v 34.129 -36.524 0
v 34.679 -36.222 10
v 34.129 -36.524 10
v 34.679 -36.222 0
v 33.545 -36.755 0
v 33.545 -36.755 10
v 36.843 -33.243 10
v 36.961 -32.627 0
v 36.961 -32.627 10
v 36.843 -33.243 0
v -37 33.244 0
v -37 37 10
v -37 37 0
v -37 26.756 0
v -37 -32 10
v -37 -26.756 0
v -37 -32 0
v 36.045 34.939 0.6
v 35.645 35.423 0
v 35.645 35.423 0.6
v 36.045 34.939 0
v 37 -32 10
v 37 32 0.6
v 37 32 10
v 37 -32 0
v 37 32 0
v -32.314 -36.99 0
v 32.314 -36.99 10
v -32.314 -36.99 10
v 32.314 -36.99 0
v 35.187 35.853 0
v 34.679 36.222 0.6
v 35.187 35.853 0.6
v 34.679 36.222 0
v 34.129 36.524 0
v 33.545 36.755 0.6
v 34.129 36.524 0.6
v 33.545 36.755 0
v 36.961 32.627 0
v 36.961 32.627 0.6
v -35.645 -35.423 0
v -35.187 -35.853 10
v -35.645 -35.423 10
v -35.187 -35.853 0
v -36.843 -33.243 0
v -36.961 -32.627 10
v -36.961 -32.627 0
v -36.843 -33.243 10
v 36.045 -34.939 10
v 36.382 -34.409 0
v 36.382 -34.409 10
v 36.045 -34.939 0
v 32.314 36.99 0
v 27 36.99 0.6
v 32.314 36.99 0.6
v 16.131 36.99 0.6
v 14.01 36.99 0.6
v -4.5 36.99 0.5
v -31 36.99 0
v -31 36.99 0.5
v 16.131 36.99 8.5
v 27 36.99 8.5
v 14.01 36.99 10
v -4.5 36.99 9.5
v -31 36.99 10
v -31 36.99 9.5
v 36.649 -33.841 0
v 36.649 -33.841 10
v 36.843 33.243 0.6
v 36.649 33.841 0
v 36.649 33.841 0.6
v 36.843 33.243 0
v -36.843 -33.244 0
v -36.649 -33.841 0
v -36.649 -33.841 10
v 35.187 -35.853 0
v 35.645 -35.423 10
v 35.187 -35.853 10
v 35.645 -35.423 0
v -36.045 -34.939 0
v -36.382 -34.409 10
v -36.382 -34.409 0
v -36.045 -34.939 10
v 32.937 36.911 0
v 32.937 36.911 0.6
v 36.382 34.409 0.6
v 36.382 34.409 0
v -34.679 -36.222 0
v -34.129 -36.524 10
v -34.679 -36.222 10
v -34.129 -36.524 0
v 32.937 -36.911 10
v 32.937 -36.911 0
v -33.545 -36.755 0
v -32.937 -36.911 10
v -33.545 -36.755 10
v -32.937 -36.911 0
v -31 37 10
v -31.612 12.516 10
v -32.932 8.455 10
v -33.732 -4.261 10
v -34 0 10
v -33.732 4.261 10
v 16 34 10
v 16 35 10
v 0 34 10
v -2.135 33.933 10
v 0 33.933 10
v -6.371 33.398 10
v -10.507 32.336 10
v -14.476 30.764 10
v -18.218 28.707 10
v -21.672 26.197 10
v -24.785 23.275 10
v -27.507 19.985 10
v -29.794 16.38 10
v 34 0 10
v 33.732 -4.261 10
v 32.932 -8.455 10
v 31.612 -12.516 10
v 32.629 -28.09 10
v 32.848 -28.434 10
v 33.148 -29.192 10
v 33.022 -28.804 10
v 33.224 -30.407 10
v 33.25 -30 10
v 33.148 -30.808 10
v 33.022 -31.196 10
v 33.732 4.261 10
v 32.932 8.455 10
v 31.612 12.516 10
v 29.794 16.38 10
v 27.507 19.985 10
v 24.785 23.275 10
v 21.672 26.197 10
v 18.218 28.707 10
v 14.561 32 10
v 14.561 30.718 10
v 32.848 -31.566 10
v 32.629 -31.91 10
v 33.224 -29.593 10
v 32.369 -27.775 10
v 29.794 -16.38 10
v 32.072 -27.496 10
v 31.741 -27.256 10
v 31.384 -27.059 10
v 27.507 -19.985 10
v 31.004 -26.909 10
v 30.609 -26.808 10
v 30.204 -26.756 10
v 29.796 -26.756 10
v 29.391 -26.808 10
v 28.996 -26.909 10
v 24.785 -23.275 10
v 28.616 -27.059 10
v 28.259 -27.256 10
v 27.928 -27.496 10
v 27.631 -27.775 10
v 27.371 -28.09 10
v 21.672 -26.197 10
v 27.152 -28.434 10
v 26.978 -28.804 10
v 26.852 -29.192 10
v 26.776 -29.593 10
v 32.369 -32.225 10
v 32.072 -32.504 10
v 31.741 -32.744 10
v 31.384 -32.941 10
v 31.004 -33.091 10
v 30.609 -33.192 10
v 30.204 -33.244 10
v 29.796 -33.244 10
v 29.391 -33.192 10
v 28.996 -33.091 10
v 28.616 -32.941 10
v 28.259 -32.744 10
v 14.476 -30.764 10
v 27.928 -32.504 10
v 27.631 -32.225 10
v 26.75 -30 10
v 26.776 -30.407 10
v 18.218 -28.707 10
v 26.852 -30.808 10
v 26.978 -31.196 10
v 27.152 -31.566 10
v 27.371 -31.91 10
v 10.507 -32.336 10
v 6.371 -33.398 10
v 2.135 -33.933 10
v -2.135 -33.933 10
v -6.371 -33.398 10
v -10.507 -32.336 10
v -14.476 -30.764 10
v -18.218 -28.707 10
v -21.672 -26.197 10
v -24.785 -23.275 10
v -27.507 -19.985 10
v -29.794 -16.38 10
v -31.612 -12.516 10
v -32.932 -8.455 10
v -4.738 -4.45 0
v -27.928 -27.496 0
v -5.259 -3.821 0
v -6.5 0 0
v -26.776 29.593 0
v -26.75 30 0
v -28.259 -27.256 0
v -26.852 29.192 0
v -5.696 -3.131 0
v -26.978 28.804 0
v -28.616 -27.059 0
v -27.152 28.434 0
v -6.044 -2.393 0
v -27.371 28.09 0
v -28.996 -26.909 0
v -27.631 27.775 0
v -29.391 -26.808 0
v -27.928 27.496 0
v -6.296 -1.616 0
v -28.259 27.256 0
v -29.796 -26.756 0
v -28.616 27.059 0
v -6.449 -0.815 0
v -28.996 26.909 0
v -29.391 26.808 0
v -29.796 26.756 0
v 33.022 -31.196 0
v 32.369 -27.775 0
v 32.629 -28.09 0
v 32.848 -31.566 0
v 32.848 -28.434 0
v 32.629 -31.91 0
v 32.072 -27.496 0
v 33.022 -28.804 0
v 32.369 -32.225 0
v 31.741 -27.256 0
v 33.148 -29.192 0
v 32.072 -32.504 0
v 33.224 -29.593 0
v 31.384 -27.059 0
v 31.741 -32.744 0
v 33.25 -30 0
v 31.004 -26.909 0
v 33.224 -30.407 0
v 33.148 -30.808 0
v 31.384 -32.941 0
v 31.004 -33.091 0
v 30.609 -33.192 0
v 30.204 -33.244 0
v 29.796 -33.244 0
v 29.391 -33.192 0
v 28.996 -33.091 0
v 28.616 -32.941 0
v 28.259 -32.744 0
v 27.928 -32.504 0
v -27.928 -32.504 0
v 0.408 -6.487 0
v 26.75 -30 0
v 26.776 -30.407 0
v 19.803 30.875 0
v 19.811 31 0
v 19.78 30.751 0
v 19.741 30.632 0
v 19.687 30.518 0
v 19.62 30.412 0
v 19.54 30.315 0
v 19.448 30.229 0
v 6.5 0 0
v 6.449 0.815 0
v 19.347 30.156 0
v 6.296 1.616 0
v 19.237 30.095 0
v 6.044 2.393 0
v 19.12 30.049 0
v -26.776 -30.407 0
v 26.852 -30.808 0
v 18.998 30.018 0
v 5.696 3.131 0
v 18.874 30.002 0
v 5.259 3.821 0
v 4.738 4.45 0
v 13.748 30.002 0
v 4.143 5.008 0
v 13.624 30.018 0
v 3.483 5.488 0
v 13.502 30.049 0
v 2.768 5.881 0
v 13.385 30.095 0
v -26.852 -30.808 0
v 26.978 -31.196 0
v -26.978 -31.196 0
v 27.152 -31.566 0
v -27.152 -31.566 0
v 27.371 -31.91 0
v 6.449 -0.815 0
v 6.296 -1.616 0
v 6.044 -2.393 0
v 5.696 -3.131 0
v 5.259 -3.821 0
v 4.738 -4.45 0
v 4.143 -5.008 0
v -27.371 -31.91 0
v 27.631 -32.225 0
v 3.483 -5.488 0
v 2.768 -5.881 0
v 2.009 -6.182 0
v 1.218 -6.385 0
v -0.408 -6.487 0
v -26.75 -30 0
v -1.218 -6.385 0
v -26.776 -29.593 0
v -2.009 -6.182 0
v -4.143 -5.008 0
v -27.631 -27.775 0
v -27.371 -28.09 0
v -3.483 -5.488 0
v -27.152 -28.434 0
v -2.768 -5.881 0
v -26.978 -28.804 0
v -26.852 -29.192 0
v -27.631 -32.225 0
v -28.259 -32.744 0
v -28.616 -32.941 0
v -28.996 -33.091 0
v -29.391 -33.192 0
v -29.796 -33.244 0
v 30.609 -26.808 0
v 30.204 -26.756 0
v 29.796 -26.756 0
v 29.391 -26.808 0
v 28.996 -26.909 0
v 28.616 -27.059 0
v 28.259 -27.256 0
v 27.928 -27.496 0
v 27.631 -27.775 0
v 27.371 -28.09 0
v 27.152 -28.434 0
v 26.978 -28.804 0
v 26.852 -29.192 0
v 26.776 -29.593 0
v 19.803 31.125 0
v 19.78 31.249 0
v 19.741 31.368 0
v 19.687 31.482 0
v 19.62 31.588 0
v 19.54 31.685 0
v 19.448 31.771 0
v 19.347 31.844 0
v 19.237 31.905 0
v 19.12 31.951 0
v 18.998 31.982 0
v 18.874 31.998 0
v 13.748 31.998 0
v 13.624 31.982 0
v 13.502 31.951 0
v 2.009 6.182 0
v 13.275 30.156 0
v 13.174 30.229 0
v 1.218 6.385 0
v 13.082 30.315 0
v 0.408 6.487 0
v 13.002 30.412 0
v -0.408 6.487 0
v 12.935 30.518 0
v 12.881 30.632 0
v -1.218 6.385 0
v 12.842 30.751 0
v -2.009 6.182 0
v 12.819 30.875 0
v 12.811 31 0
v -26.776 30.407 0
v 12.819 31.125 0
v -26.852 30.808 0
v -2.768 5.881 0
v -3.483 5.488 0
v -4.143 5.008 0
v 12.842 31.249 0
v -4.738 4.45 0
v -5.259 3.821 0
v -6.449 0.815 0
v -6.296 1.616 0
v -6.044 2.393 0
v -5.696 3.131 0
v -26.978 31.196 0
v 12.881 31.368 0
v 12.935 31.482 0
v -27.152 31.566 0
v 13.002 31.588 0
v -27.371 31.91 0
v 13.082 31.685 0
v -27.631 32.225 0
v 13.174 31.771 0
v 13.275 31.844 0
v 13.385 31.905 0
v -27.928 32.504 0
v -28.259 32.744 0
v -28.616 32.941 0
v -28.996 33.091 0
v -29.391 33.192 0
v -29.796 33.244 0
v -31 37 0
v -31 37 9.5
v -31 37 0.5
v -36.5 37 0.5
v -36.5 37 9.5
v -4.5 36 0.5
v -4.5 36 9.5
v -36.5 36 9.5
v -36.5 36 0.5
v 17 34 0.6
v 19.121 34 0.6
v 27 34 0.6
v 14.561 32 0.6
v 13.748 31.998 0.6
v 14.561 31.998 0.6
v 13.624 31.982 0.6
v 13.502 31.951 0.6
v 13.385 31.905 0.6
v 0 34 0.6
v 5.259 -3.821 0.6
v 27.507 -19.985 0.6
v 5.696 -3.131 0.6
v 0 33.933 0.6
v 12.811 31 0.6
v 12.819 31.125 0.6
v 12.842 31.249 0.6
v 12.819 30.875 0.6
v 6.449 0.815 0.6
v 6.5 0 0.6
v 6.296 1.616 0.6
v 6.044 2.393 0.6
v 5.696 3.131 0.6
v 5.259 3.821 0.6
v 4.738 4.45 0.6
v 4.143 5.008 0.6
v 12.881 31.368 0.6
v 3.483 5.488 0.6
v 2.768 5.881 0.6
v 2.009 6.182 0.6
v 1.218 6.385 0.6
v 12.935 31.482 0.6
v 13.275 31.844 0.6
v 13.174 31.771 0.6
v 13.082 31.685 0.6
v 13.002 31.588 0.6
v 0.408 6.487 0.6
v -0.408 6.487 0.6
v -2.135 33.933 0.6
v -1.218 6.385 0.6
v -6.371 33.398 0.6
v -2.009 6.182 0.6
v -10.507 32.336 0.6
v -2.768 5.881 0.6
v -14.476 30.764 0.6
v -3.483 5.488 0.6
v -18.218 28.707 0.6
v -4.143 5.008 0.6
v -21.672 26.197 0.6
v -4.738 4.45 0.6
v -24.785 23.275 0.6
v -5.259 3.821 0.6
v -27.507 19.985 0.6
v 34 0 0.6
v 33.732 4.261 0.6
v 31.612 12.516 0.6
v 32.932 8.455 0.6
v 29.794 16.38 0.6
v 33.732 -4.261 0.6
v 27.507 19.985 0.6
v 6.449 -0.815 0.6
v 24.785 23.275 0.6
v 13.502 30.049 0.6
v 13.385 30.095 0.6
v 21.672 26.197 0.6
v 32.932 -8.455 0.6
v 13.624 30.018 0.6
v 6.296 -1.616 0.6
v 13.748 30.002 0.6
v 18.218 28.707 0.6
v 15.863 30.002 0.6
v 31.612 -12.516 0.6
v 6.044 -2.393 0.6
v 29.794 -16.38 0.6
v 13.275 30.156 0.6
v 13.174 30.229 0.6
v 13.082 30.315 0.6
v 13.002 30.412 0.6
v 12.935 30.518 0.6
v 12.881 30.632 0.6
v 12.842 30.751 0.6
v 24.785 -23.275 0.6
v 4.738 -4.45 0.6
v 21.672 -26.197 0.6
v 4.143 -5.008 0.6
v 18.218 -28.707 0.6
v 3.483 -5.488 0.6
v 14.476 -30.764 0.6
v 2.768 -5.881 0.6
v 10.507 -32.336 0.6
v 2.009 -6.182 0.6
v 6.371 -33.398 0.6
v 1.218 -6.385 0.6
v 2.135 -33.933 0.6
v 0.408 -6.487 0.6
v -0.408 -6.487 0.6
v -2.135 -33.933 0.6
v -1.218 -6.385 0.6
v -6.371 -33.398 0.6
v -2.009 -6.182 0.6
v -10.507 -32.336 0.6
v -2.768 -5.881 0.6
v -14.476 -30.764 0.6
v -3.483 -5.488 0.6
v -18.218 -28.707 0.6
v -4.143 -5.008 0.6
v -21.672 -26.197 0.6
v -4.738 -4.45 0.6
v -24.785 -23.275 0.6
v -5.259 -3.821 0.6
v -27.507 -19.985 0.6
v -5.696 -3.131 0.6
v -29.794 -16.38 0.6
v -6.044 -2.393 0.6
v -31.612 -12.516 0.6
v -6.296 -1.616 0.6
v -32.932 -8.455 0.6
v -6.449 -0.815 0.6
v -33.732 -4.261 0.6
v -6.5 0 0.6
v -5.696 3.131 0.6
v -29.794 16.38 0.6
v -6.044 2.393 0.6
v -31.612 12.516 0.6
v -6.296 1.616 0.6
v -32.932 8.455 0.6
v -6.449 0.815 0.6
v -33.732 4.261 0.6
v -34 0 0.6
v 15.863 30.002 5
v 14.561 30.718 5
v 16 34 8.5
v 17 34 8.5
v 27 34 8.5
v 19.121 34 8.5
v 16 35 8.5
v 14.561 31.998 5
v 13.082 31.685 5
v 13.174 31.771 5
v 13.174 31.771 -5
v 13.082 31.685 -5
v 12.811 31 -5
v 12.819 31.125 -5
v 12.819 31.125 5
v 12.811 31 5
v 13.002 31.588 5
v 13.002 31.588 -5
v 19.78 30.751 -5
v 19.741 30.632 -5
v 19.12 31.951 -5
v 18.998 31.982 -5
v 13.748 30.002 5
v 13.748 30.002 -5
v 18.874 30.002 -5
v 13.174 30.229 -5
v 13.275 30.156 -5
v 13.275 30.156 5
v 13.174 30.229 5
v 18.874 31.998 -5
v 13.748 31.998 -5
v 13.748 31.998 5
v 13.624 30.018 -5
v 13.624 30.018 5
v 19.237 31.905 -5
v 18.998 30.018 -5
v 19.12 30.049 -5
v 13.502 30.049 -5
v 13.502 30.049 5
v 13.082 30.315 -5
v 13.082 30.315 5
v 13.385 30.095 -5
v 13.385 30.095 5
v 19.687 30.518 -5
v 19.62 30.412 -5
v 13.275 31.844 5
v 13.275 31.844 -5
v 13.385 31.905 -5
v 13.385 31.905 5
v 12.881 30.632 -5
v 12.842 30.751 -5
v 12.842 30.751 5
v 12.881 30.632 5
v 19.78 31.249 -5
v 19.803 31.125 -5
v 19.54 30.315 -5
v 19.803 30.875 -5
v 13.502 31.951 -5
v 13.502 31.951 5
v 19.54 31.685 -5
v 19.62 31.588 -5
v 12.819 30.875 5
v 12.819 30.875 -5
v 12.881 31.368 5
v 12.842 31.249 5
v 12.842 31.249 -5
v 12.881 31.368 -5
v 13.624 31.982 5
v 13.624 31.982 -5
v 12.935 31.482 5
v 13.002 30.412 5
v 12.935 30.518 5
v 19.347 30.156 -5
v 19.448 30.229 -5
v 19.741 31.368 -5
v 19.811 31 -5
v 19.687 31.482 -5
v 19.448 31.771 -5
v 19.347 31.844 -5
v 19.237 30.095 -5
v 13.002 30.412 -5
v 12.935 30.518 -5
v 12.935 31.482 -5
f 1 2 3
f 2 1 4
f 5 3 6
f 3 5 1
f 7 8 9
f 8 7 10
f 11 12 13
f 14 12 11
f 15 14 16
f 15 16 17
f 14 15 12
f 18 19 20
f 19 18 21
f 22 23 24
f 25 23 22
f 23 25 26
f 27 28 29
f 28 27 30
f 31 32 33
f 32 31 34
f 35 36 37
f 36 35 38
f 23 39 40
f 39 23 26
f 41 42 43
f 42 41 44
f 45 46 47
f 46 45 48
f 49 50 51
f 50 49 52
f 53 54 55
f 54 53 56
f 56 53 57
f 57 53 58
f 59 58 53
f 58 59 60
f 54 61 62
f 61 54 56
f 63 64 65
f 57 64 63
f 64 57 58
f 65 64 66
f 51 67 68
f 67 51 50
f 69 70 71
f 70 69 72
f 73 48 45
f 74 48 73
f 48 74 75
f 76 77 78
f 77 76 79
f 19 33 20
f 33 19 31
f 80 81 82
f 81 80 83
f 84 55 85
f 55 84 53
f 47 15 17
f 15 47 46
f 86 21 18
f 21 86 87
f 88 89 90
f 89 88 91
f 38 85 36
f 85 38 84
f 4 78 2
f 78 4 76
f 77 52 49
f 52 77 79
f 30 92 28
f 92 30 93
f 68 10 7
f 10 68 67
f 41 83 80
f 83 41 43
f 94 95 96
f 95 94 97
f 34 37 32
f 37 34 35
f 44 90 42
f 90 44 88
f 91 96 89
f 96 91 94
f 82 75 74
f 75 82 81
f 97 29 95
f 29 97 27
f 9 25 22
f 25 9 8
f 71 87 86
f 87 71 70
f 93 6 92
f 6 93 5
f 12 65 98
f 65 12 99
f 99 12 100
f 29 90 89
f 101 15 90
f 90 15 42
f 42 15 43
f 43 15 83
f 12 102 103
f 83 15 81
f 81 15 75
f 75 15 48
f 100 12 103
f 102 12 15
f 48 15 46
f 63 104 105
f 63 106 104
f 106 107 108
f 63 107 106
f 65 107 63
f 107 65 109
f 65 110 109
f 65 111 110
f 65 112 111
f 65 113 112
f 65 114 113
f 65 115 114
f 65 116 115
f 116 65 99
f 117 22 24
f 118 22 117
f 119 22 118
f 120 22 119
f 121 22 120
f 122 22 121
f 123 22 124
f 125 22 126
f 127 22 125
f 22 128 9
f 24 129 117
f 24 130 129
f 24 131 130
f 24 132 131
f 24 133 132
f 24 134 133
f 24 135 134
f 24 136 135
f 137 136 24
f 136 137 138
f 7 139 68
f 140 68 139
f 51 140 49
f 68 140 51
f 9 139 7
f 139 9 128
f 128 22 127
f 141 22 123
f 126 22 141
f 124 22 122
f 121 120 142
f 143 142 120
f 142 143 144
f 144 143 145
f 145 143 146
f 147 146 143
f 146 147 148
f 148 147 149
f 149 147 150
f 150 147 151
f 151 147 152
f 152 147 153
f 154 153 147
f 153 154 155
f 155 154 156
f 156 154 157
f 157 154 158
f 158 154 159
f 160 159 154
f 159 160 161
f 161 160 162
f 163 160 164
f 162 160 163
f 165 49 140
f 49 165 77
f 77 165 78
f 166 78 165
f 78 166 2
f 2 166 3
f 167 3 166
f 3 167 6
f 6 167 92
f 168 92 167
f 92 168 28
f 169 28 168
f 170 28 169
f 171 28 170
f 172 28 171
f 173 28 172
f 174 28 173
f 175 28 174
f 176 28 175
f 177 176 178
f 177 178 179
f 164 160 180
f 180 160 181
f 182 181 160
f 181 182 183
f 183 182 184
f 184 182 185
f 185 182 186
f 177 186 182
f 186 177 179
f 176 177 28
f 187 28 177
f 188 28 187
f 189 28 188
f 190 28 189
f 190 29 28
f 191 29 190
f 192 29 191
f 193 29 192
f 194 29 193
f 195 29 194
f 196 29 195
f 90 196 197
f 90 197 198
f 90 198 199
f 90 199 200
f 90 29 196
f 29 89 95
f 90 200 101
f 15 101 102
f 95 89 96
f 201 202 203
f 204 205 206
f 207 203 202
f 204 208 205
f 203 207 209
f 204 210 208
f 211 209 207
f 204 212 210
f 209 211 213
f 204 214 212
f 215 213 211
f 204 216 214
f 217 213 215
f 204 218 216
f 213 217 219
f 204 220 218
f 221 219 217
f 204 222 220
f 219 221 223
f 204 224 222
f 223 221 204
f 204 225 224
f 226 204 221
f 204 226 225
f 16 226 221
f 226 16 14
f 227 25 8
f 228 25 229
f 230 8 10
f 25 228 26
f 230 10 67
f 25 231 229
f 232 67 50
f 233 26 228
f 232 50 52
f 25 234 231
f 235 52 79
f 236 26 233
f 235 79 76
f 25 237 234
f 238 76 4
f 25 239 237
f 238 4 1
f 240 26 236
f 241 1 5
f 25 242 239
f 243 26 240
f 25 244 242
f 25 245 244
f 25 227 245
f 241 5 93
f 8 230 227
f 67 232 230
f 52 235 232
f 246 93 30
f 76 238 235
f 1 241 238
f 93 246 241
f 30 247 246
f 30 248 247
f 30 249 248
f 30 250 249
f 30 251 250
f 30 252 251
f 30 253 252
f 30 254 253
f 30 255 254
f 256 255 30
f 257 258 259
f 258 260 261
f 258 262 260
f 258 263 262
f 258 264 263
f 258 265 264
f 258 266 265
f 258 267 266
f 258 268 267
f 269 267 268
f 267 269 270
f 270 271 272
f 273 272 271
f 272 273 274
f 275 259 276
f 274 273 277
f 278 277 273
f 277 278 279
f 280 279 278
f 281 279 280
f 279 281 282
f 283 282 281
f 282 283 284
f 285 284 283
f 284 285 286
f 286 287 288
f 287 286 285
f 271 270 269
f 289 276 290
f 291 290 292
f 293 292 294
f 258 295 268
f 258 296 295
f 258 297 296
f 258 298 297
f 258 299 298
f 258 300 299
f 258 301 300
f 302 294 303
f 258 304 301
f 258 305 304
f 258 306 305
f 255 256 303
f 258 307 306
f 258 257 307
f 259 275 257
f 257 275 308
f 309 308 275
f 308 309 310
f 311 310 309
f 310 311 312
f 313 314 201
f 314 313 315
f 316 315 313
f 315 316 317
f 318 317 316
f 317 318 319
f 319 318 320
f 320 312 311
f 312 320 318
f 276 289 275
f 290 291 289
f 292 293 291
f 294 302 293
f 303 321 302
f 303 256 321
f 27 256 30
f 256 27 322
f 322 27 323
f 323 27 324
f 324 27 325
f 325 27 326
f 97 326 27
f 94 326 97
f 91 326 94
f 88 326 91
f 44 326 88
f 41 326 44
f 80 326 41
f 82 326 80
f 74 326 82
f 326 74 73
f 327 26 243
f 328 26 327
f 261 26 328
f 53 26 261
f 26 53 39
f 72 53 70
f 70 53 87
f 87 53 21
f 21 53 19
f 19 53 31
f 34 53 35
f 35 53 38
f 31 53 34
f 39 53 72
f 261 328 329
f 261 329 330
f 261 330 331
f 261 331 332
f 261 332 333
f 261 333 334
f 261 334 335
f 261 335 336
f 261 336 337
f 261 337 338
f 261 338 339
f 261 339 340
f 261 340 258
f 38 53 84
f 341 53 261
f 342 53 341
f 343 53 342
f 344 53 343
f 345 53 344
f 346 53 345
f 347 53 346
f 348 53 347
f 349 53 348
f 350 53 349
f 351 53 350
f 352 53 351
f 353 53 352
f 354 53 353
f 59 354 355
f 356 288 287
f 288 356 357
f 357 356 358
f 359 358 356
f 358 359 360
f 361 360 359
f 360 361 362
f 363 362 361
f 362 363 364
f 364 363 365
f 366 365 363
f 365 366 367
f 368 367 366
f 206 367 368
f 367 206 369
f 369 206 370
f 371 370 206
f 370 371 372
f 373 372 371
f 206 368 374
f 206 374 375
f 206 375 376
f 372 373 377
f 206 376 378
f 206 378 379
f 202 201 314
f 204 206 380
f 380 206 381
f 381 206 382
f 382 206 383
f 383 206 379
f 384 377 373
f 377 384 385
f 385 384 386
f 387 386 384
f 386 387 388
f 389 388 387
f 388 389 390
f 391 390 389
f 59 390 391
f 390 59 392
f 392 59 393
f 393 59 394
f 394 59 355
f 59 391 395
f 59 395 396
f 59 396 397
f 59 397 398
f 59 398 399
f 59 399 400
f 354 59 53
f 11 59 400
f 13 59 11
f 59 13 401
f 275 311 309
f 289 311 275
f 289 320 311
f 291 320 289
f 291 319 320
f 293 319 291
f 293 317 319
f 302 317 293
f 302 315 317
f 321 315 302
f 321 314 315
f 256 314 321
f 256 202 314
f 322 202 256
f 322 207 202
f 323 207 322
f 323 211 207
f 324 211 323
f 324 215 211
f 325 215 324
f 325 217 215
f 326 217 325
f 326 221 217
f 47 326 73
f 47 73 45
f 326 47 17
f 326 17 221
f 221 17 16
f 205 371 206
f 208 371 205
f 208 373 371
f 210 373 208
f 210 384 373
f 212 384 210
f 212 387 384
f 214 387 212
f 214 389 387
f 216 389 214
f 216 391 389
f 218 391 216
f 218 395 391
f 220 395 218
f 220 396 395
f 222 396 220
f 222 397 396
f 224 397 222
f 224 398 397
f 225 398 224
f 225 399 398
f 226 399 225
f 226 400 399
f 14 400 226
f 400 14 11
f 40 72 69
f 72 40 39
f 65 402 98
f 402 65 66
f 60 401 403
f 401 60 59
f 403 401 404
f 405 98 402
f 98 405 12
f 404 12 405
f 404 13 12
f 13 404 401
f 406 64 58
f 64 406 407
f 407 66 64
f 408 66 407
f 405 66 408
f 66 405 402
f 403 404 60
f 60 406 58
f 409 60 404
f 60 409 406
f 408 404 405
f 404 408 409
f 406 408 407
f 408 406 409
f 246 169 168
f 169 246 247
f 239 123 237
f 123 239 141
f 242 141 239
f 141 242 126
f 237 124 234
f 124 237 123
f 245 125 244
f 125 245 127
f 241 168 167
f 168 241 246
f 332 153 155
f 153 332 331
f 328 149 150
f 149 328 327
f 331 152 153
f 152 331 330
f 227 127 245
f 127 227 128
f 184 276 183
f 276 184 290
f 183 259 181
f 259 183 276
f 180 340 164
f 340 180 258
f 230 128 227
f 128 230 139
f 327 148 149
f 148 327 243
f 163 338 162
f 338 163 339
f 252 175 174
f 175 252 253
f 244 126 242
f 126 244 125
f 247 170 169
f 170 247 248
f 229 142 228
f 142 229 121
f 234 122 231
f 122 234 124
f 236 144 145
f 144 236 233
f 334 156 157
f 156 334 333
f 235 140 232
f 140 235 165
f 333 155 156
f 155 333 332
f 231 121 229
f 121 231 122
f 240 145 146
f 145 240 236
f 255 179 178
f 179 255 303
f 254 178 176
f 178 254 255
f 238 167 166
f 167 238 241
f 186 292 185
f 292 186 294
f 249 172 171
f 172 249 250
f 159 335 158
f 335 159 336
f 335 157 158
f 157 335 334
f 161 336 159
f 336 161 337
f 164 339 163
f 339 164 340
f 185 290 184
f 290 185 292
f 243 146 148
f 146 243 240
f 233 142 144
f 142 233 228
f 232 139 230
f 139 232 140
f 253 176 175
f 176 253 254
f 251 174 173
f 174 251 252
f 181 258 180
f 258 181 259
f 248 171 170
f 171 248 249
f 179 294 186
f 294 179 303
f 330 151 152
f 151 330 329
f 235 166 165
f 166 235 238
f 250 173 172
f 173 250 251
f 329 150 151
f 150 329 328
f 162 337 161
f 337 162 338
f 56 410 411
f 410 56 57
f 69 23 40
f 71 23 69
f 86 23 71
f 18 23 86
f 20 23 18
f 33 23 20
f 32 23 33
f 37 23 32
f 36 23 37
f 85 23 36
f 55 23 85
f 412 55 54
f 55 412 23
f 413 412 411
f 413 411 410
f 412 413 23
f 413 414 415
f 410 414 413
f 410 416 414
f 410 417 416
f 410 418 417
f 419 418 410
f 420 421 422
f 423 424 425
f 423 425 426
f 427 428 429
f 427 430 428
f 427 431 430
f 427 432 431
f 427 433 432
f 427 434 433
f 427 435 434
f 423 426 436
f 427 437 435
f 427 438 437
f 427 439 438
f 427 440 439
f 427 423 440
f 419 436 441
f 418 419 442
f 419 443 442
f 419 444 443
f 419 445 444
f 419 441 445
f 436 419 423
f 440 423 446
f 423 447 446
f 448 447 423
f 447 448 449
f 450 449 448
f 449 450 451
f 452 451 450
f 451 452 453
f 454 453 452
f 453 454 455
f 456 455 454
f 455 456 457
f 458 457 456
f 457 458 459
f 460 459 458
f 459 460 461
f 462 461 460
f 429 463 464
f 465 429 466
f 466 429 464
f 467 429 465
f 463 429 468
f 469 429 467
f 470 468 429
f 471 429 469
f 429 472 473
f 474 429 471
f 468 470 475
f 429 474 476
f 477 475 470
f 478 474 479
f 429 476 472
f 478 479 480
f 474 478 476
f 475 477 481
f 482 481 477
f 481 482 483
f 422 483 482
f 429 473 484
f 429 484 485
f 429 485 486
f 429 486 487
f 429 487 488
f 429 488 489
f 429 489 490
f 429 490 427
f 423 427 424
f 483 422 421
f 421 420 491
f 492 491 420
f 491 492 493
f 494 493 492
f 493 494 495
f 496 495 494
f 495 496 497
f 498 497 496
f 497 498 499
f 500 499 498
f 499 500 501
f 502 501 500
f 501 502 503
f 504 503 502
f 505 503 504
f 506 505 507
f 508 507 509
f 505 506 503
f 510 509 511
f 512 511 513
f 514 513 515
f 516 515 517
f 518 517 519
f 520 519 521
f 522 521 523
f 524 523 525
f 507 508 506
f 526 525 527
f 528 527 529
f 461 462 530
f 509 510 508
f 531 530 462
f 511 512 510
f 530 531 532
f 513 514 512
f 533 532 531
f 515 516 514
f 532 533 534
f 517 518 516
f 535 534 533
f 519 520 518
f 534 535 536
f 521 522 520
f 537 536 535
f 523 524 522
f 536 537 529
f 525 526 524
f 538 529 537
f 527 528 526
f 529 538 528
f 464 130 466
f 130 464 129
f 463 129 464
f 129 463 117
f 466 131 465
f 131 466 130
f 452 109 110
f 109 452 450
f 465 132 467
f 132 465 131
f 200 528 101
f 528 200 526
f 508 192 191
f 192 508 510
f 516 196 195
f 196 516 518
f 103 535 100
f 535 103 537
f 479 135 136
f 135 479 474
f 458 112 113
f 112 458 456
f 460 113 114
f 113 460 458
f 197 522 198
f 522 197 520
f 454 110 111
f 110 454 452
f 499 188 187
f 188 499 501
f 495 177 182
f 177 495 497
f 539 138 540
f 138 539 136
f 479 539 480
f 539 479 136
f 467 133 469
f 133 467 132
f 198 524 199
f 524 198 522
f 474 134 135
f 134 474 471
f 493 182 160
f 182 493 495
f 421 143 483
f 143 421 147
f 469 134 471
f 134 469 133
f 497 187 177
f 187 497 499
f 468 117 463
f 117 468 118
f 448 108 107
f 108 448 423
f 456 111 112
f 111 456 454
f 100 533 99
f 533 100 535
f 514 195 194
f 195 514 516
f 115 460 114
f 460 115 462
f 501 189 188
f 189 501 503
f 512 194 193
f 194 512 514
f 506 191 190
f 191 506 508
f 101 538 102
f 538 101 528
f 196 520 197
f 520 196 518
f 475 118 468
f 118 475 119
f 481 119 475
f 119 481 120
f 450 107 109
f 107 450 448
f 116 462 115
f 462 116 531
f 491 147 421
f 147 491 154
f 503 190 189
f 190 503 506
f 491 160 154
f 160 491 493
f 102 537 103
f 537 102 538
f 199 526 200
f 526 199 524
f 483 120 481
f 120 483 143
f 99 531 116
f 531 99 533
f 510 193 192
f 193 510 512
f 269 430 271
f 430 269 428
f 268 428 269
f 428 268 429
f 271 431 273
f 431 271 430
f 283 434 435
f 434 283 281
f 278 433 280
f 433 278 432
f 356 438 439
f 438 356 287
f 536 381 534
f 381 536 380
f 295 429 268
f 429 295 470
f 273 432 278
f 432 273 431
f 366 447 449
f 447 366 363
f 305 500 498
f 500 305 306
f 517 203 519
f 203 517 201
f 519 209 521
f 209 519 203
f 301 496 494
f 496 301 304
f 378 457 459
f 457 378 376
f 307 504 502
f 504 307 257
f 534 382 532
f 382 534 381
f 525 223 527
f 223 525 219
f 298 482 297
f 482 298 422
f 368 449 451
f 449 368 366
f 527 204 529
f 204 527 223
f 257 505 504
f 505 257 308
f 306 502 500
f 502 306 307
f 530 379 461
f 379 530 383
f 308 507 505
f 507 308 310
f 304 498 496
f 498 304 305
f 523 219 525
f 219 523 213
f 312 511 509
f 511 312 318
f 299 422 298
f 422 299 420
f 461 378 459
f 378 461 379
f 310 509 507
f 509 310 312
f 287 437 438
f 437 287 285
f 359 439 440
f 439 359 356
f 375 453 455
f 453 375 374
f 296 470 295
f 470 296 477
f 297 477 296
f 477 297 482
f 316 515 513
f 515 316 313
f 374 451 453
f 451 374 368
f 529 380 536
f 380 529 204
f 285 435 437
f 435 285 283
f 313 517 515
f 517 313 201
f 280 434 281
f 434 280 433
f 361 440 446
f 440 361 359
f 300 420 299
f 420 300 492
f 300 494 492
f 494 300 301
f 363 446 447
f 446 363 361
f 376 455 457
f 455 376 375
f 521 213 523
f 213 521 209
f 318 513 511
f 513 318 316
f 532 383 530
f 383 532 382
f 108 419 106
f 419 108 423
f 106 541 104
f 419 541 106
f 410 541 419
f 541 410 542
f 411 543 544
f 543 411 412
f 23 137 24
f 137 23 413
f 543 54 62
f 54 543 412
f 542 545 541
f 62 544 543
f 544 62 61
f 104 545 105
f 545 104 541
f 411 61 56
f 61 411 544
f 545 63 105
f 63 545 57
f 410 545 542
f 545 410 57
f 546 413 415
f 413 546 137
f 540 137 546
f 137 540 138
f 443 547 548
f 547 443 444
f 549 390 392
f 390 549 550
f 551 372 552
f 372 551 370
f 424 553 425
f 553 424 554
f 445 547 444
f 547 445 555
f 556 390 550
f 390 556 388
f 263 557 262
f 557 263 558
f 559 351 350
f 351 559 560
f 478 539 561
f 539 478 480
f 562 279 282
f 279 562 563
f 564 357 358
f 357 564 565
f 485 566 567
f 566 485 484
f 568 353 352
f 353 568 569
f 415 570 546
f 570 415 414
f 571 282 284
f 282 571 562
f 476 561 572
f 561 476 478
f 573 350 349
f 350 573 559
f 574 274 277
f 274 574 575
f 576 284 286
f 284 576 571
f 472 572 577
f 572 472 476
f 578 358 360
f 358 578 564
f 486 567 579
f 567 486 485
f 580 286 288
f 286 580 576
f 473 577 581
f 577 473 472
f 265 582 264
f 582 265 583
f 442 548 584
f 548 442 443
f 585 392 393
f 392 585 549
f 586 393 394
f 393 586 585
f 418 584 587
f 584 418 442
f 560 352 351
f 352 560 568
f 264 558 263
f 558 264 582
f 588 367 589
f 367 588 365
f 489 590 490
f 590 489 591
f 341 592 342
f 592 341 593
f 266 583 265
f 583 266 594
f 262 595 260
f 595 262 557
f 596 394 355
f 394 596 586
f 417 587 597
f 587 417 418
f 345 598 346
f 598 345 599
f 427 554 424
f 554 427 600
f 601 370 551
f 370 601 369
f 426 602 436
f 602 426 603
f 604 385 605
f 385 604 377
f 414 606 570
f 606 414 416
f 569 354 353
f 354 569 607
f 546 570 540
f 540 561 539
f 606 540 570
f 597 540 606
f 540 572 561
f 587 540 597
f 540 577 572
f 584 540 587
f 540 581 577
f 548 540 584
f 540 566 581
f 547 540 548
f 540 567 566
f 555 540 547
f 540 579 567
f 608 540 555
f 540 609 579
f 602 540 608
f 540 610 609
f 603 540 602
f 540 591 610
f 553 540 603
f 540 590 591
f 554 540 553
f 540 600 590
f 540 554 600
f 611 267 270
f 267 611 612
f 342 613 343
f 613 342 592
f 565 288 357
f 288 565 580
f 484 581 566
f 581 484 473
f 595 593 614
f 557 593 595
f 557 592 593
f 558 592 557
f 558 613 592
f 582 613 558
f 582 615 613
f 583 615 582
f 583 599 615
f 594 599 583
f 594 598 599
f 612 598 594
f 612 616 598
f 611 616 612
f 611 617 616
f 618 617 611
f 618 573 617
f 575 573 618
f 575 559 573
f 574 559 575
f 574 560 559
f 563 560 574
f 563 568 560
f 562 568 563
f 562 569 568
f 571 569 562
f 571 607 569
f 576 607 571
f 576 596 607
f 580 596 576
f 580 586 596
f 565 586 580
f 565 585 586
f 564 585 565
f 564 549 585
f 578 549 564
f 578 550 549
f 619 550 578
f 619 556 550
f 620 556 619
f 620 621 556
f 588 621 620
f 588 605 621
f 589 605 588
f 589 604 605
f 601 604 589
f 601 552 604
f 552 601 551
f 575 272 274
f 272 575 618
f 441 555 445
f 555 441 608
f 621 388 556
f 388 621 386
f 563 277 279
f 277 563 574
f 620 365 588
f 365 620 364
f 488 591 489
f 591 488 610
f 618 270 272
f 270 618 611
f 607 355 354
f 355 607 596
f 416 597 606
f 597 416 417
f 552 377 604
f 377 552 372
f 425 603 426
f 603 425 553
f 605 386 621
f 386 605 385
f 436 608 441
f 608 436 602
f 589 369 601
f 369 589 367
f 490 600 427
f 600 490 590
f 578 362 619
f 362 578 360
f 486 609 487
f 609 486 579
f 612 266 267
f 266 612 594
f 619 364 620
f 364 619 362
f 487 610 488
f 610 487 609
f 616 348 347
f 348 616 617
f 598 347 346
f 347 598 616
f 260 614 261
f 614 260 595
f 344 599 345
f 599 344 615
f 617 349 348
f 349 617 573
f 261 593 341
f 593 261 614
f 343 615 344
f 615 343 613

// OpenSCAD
$fn = 50;


union() {
	difference() {
		union() {
			hull() {
				translate(v = [-32.0000000000, 32.0000000000, 0]) {
					cylinder(h = 10, r = 5);
				}
				translate(v = [32.0000000000, 32.0000000000, 0]) {
					cylinder(h = 10, r = 5);
				}
				translate(v = [-32.0000000000, -32.0000000000, 0]) {
					cylinder(h = 10, r = 5);
				}
				translate(v = [32.0000000000, -32.0000000000, 0]) {
					cylinder(h = 10, r = 5);
				}
			}
			translate(v = [-37.0000000000, 31.0000000000, 0]) {
				cube(size = [6, 6, 10]);
			}
		}
		union() {
			translate(v = [-37.5000000000, -30.0000000000, -250.0000000000]) {
				rotate(a = [0, 0, 0]) {
					difference() {
						union() {
							hull() {
								translate(v = [7.5000000000, 0, 0]) {
									cylinder(h = 250, r = 3.2500000000, r1 = 3.2500000000, r2 = 3.2500000000);
								}
								translate(v = [-7.5000000000, 0, 0]) {
									cylinder(h = 250, r = 3.2500000000, r1 = 3.2500000000, r2 = 3.2500000000);
								}
							}
						}
						union();
					}
				}
			}
			translate(v = [-37.5000000000, 30.0000000000, -250.0000000000]) {
				rotate(a = [0, 0, 0]) {
					difference() {
						union() {
							hull() {
								translate(v = [7.5000000000, 0, 0]) {
									cylinder(h = 250, r = 3.2500000000, r1 = 3.2500000000, r2 = 3.2500000000);
								}
								translate(v = [-7.5000000000, 0, 0]) {
									cylinder(h = 250, r = 3.2500000000, r1 = 3.2500000000, r2 = 3.2500000000);
								}
							}
						}
						union();
					}
				}
			}
			translate(v = [-36.5000000000, 36.0000000000, 0.5000000000]) {
				cube(size = [32, 1, 9.0000000000]);
			}
			translate(v = [30.0000000000, -30.0000000000, 0]) {
				cylinder(h = 100, r = 3.2500000000);
			}
			translate(v = [0, 0, 0.6000000000]) {
				cylinder(h = 12.4000000000, r = 34.0000000000);
			}
			translate(v = [0, 0, -5.0000000000]) {
				cylinder(h = 10, r = 6.5000000000);
			}
			translate(v = [0.0000000000, 32.0000000000, 0.6000000000]) {
				cube(size = [37.0000000000, 2, 12.4000000000]);
			}
			translate(v = [27.0000000000, 32.0000000000, 0.6000000000]) {
				cube(size = [10, 5, 12.4000000000]);
			}
			translate(v = [16.0000000000, 32.0000000000, 8.5000000000]) {
				cube(size = [21, 5, 1.5000000000]);
			}
			translate(v = [13.2500000000, 37.7500000000, 0.6000000000]) {
				rotate(a = [0, 0, -45]) {
					cube(size = [7.5000000000, 1.5000000000, 12.4000000000]);
				}
			}
			translate(v = [7.0610000000, 30.0000000000, 0.6000000000]) {
				cube(size = [7.5000000000, 2, 9.4000000000]);
			}
		}
	}
	union() {
		translate(v = [16.3110000000, 31.0000000000, -5.0000000000]) {
			rotate(a = [0, 0, 0]) {
				difference() {
					union() {
						#hull() {
							#translate(v = [2.5000000000, 0, 0]) {
								cylinder(h = 10, r = 1.0000000000, r1 = 1.0000000000, r2 = 1.0000000000);
							}
							#translate(v = [-2.5000000000, 0, 0]) {
								cylinder(h = 10, r = 1.0000000000, r1 = 1.0000000000, r2 = 1.0000000000);
							}
						}
					}
					union();
				}
			}
		}
	}
}
